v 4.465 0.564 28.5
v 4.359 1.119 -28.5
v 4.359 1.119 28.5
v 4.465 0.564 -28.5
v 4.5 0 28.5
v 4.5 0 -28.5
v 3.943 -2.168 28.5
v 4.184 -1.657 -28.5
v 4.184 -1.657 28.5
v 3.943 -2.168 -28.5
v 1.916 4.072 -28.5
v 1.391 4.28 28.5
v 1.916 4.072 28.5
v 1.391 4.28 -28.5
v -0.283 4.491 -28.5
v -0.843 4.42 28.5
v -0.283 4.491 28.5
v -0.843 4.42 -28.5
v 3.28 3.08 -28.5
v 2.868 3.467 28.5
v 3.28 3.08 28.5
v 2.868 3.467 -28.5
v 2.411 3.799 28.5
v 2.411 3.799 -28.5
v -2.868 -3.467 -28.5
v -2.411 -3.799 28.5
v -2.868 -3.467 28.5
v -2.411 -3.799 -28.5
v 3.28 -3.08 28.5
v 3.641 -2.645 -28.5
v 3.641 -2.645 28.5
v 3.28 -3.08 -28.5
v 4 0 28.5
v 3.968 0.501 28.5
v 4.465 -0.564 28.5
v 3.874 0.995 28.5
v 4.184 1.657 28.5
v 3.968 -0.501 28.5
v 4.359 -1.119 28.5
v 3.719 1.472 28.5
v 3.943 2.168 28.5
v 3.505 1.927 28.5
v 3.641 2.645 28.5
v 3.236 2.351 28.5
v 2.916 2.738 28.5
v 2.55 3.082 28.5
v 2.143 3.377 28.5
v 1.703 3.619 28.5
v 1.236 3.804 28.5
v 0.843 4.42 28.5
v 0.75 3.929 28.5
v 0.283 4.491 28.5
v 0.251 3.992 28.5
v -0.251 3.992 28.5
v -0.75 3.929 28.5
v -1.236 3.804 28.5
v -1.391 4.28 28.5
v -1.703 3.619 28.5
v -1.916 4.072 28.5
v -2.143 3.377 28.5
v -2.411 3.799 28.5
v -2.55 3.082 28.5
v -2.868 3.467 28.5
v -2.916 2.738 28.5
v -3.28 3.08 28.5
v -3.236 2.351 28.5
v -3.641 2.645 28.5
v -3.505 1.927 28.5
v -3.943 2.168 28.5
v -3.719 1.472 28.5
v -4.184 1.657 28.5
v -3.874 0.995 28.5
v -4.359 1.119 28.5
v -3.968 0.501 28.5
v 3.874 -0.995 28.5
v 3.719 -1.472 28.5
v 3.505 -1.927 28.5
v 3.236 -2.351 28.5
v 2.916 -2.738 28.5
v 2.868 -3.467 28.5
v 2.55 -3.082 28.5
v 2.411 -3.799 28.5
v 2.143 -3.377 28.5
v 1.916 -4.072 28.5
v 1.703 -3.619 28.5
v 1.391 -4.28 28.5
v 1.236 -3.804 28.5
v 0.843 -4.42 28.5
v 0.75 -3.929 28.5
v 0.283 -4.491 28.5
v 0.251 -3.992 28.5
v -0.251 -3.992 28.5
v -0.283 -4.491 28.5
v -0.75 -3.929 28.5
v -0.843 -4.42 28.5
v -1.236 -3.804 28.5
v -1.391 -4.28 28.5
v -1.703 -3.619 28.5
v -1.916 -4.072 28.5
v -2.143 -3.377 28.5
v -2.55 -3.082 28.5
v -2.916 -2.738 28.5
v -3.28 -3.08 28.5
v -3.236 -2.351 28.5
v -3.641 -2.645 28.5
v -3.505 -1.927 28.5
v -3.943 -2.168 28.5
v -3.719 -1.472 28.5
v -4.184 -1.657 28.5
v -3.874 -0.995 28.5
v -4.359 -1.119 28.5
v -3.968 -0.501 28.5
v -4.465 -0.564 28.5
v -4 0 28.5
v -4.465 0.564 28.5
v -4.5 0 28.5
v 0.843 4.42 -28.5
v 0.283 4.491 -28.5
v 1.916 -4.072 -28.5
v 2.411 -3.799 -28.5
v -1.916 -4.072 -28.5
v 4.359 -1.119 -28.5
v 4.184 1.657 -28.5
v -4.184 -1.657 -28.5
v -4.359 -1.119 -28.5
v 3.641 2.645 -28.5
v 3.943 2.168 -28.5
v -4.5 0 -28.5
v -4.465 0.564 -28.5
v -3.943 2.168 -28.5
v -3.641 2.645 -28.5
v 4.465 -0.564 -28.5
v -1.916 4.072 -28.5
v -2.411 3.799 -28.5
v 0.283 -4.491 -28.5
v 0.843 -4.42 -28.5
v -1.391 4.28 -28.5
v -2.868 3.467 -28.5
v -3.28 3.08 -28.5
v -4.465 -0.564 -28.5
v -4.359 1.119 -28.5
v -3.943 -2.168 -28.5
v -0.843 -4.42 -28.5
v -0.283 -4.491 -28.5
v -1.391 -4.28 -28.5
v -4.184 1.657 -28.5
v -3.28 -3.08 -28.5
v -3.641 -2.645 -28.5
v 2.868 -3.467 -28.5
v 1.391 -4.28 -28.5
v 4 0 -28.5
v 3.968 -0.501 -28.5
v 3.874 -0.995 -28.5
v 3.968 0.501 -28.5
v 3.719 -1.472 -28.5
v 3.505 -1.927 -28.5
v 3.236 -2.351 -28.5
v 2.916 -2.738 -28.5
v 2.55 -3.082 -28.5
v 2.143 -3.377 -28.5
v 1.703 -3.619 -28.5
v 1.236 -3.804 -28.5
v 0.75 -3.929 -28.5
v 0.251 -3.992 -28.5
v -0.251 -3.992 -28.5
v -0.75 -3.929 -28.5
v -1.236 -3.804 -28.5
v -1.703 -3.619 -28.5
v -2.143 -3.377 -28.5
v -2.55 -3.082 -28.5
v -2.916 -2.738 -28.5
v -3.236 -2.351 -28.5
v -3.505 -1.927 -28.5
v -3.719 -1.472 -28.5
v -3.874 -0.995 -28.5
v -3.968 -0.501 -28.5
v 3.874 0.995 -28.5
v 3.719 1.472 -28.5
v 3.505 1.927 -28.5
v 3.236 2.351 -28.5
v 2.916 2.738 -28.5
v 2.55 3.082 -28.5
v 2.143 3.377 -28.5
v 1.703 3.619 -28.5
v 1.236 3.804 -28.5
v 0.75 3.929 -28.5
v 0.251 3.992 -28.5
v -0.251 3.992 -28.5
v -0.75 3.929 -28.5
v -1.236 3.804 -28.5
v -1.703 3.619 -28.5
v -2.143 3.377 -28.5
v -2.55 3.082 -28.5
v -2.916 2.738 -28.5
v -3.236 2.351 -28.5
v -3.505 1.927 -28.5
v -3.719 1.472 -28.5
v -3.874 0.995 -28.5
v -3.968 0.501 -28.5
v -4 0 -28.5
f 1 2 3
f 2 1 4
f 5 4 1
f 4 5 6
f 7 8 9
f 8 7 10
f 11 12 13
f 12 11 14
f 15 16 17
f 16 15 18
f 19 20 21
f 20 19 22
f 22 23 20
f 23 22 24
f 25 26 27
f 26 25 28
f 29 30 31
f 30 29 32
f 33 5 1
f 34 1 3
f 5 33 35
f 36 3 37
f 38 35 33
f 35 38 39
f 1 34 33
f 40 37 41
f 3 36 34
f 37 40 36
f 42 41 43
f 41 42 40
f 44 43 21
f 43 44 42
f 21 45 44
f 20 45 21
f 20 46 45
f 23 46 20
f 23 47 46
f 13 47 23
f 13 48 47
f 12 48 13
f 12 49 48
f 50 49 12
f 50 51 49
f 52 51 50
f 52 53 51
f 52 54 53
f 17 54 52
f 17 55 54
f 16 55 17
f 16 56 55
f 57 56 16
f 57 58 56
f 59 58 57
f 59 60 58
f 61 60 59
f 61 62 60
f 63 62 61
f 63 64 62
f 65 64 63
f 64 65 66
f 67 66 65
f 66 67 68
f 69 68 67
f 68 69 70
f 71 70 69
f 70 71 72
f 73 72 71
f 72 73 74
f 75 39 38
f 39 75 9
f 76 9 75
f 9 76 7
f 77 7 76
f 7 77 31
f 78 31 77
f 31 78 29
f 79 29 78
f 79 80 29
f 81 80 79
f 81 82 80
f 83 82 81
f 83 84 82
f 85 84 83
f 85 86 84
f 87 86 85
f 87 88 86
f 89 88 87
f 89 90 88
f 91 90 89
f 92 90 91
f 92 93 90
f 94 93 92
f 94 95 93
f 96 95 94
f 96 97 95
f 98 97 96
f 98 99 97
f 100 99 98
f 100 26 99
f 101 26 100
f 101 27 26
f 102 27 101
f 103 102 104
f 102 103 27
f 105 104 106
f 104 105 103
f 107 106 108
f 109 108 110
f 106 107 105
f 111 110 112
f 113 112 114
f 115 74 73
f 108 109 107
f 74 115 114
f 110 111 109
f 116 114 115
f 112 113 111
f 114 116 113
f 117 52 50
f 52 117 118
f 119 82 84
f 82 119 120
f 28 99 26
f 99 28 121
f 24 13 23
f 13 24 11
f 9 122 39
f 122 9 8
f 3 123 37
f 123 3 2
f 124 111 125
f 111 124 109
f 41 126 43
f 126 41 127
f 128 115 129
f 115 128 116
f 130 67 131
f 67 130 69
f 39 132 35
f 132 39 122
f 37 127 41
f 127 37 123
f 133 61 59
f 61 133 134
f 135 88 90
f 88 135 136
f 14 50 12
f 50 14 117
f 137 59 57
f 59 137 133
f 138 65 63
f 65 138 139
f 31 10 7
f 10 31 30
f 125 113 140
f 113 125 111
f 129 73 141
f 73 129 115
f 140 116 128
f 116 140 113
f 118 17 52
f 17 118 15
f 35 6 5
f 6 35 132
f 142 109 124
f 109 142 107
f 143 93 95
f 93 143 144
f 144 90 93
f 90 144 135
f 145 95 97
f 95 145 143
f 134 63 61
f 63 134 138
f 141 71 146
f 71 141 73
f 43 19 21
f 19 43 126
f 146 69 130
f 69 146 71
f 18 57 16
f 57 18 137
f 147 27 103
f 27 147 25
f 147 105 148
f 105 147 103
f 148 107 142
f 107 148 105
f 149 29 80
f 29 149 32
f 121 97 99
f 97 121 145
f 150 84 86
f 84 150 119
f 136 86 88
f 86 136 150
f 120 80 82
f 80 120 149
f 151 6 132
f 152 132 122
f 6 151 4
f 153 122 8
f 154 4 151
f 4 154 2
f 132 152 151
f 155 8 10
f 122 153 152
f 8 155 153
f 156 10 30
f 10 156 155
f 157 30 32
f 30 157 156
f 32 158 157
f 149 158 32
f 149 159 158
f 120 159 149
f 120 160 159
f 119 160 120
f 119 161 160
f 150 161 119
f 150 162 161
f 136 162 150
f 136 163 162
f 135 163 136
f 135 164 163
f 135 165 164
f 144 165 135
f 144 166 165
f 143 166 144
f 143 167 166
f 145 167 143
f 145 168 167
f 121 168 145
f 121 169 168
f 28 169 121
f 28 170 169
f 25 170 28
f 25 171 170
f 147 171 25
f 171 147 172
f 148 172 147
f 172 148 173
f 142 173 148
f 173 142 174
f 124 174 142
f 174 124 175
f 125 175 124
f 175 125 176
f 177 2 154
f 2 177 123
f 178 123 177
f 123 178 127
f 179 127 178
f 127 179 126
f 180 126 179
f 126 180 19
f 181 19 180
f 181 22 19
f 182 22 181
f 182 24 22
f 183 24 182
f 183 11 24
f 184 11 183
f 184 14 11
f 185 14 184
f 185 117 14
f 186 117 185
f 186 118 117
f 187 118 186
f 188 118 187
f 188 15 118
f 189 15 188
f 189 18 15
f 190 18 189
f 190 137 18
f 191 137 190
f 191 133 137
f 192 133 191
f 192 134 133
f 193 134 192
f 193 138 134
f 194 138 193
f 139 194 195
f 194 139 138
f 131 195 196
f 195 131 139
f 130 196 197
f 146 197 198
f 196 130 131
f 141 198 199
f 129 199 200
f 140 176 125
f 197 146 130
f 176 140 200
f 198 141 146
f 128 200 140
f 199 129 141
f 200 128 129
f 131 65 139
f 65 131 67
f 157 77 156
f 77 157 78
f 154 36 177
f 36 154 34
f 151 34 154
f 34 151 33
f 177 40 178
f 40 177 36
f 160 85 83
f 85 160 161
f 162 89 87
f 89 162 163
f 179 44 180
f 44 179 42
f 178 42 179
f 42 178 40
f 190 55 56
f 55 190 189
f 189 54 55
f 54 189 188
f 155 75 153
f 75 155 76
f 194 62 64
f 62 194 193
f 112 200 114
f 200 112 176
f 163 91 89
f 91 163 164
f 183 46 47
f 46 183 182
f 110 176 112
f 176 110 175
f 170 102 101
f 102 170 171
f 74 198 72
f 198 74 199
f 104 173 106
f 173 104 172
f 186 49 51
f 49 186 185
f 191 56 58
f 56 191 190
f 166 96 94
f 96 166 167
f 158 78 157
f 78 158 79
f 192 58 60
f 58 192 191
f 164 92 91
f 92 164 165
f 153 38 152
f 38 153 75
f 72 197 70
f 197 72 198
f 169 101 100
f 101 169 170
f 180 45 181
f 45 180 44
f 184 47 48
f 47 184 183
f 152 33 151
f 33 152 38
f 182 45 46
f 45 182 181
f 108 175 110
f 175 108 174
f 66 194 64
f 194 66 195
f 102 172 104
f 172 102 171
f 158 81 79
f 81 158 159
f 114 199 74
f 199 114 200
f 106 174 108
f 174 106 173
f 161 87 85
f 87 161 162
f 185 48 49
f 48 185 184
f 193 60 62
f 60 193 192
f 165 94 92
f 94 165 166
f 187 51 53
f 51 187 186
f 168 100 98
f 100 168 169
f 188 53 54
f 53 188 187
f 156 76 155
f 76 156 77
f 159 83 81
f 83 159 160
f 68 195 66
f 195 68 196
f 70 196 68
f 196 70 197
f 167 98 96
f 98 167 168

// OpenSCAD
$fn = 50;


difference() {
	union() {
		translate(v = [0, 0, -28.5000000000]) {
			cylinder(h = 57, r = 4.5000000000);
		}
	}
	union() {
		translate(v = [0, 0, -100.0000000000]) {
			cylinder(h = 200, r = 4.0000000000);
		}
	}
}
